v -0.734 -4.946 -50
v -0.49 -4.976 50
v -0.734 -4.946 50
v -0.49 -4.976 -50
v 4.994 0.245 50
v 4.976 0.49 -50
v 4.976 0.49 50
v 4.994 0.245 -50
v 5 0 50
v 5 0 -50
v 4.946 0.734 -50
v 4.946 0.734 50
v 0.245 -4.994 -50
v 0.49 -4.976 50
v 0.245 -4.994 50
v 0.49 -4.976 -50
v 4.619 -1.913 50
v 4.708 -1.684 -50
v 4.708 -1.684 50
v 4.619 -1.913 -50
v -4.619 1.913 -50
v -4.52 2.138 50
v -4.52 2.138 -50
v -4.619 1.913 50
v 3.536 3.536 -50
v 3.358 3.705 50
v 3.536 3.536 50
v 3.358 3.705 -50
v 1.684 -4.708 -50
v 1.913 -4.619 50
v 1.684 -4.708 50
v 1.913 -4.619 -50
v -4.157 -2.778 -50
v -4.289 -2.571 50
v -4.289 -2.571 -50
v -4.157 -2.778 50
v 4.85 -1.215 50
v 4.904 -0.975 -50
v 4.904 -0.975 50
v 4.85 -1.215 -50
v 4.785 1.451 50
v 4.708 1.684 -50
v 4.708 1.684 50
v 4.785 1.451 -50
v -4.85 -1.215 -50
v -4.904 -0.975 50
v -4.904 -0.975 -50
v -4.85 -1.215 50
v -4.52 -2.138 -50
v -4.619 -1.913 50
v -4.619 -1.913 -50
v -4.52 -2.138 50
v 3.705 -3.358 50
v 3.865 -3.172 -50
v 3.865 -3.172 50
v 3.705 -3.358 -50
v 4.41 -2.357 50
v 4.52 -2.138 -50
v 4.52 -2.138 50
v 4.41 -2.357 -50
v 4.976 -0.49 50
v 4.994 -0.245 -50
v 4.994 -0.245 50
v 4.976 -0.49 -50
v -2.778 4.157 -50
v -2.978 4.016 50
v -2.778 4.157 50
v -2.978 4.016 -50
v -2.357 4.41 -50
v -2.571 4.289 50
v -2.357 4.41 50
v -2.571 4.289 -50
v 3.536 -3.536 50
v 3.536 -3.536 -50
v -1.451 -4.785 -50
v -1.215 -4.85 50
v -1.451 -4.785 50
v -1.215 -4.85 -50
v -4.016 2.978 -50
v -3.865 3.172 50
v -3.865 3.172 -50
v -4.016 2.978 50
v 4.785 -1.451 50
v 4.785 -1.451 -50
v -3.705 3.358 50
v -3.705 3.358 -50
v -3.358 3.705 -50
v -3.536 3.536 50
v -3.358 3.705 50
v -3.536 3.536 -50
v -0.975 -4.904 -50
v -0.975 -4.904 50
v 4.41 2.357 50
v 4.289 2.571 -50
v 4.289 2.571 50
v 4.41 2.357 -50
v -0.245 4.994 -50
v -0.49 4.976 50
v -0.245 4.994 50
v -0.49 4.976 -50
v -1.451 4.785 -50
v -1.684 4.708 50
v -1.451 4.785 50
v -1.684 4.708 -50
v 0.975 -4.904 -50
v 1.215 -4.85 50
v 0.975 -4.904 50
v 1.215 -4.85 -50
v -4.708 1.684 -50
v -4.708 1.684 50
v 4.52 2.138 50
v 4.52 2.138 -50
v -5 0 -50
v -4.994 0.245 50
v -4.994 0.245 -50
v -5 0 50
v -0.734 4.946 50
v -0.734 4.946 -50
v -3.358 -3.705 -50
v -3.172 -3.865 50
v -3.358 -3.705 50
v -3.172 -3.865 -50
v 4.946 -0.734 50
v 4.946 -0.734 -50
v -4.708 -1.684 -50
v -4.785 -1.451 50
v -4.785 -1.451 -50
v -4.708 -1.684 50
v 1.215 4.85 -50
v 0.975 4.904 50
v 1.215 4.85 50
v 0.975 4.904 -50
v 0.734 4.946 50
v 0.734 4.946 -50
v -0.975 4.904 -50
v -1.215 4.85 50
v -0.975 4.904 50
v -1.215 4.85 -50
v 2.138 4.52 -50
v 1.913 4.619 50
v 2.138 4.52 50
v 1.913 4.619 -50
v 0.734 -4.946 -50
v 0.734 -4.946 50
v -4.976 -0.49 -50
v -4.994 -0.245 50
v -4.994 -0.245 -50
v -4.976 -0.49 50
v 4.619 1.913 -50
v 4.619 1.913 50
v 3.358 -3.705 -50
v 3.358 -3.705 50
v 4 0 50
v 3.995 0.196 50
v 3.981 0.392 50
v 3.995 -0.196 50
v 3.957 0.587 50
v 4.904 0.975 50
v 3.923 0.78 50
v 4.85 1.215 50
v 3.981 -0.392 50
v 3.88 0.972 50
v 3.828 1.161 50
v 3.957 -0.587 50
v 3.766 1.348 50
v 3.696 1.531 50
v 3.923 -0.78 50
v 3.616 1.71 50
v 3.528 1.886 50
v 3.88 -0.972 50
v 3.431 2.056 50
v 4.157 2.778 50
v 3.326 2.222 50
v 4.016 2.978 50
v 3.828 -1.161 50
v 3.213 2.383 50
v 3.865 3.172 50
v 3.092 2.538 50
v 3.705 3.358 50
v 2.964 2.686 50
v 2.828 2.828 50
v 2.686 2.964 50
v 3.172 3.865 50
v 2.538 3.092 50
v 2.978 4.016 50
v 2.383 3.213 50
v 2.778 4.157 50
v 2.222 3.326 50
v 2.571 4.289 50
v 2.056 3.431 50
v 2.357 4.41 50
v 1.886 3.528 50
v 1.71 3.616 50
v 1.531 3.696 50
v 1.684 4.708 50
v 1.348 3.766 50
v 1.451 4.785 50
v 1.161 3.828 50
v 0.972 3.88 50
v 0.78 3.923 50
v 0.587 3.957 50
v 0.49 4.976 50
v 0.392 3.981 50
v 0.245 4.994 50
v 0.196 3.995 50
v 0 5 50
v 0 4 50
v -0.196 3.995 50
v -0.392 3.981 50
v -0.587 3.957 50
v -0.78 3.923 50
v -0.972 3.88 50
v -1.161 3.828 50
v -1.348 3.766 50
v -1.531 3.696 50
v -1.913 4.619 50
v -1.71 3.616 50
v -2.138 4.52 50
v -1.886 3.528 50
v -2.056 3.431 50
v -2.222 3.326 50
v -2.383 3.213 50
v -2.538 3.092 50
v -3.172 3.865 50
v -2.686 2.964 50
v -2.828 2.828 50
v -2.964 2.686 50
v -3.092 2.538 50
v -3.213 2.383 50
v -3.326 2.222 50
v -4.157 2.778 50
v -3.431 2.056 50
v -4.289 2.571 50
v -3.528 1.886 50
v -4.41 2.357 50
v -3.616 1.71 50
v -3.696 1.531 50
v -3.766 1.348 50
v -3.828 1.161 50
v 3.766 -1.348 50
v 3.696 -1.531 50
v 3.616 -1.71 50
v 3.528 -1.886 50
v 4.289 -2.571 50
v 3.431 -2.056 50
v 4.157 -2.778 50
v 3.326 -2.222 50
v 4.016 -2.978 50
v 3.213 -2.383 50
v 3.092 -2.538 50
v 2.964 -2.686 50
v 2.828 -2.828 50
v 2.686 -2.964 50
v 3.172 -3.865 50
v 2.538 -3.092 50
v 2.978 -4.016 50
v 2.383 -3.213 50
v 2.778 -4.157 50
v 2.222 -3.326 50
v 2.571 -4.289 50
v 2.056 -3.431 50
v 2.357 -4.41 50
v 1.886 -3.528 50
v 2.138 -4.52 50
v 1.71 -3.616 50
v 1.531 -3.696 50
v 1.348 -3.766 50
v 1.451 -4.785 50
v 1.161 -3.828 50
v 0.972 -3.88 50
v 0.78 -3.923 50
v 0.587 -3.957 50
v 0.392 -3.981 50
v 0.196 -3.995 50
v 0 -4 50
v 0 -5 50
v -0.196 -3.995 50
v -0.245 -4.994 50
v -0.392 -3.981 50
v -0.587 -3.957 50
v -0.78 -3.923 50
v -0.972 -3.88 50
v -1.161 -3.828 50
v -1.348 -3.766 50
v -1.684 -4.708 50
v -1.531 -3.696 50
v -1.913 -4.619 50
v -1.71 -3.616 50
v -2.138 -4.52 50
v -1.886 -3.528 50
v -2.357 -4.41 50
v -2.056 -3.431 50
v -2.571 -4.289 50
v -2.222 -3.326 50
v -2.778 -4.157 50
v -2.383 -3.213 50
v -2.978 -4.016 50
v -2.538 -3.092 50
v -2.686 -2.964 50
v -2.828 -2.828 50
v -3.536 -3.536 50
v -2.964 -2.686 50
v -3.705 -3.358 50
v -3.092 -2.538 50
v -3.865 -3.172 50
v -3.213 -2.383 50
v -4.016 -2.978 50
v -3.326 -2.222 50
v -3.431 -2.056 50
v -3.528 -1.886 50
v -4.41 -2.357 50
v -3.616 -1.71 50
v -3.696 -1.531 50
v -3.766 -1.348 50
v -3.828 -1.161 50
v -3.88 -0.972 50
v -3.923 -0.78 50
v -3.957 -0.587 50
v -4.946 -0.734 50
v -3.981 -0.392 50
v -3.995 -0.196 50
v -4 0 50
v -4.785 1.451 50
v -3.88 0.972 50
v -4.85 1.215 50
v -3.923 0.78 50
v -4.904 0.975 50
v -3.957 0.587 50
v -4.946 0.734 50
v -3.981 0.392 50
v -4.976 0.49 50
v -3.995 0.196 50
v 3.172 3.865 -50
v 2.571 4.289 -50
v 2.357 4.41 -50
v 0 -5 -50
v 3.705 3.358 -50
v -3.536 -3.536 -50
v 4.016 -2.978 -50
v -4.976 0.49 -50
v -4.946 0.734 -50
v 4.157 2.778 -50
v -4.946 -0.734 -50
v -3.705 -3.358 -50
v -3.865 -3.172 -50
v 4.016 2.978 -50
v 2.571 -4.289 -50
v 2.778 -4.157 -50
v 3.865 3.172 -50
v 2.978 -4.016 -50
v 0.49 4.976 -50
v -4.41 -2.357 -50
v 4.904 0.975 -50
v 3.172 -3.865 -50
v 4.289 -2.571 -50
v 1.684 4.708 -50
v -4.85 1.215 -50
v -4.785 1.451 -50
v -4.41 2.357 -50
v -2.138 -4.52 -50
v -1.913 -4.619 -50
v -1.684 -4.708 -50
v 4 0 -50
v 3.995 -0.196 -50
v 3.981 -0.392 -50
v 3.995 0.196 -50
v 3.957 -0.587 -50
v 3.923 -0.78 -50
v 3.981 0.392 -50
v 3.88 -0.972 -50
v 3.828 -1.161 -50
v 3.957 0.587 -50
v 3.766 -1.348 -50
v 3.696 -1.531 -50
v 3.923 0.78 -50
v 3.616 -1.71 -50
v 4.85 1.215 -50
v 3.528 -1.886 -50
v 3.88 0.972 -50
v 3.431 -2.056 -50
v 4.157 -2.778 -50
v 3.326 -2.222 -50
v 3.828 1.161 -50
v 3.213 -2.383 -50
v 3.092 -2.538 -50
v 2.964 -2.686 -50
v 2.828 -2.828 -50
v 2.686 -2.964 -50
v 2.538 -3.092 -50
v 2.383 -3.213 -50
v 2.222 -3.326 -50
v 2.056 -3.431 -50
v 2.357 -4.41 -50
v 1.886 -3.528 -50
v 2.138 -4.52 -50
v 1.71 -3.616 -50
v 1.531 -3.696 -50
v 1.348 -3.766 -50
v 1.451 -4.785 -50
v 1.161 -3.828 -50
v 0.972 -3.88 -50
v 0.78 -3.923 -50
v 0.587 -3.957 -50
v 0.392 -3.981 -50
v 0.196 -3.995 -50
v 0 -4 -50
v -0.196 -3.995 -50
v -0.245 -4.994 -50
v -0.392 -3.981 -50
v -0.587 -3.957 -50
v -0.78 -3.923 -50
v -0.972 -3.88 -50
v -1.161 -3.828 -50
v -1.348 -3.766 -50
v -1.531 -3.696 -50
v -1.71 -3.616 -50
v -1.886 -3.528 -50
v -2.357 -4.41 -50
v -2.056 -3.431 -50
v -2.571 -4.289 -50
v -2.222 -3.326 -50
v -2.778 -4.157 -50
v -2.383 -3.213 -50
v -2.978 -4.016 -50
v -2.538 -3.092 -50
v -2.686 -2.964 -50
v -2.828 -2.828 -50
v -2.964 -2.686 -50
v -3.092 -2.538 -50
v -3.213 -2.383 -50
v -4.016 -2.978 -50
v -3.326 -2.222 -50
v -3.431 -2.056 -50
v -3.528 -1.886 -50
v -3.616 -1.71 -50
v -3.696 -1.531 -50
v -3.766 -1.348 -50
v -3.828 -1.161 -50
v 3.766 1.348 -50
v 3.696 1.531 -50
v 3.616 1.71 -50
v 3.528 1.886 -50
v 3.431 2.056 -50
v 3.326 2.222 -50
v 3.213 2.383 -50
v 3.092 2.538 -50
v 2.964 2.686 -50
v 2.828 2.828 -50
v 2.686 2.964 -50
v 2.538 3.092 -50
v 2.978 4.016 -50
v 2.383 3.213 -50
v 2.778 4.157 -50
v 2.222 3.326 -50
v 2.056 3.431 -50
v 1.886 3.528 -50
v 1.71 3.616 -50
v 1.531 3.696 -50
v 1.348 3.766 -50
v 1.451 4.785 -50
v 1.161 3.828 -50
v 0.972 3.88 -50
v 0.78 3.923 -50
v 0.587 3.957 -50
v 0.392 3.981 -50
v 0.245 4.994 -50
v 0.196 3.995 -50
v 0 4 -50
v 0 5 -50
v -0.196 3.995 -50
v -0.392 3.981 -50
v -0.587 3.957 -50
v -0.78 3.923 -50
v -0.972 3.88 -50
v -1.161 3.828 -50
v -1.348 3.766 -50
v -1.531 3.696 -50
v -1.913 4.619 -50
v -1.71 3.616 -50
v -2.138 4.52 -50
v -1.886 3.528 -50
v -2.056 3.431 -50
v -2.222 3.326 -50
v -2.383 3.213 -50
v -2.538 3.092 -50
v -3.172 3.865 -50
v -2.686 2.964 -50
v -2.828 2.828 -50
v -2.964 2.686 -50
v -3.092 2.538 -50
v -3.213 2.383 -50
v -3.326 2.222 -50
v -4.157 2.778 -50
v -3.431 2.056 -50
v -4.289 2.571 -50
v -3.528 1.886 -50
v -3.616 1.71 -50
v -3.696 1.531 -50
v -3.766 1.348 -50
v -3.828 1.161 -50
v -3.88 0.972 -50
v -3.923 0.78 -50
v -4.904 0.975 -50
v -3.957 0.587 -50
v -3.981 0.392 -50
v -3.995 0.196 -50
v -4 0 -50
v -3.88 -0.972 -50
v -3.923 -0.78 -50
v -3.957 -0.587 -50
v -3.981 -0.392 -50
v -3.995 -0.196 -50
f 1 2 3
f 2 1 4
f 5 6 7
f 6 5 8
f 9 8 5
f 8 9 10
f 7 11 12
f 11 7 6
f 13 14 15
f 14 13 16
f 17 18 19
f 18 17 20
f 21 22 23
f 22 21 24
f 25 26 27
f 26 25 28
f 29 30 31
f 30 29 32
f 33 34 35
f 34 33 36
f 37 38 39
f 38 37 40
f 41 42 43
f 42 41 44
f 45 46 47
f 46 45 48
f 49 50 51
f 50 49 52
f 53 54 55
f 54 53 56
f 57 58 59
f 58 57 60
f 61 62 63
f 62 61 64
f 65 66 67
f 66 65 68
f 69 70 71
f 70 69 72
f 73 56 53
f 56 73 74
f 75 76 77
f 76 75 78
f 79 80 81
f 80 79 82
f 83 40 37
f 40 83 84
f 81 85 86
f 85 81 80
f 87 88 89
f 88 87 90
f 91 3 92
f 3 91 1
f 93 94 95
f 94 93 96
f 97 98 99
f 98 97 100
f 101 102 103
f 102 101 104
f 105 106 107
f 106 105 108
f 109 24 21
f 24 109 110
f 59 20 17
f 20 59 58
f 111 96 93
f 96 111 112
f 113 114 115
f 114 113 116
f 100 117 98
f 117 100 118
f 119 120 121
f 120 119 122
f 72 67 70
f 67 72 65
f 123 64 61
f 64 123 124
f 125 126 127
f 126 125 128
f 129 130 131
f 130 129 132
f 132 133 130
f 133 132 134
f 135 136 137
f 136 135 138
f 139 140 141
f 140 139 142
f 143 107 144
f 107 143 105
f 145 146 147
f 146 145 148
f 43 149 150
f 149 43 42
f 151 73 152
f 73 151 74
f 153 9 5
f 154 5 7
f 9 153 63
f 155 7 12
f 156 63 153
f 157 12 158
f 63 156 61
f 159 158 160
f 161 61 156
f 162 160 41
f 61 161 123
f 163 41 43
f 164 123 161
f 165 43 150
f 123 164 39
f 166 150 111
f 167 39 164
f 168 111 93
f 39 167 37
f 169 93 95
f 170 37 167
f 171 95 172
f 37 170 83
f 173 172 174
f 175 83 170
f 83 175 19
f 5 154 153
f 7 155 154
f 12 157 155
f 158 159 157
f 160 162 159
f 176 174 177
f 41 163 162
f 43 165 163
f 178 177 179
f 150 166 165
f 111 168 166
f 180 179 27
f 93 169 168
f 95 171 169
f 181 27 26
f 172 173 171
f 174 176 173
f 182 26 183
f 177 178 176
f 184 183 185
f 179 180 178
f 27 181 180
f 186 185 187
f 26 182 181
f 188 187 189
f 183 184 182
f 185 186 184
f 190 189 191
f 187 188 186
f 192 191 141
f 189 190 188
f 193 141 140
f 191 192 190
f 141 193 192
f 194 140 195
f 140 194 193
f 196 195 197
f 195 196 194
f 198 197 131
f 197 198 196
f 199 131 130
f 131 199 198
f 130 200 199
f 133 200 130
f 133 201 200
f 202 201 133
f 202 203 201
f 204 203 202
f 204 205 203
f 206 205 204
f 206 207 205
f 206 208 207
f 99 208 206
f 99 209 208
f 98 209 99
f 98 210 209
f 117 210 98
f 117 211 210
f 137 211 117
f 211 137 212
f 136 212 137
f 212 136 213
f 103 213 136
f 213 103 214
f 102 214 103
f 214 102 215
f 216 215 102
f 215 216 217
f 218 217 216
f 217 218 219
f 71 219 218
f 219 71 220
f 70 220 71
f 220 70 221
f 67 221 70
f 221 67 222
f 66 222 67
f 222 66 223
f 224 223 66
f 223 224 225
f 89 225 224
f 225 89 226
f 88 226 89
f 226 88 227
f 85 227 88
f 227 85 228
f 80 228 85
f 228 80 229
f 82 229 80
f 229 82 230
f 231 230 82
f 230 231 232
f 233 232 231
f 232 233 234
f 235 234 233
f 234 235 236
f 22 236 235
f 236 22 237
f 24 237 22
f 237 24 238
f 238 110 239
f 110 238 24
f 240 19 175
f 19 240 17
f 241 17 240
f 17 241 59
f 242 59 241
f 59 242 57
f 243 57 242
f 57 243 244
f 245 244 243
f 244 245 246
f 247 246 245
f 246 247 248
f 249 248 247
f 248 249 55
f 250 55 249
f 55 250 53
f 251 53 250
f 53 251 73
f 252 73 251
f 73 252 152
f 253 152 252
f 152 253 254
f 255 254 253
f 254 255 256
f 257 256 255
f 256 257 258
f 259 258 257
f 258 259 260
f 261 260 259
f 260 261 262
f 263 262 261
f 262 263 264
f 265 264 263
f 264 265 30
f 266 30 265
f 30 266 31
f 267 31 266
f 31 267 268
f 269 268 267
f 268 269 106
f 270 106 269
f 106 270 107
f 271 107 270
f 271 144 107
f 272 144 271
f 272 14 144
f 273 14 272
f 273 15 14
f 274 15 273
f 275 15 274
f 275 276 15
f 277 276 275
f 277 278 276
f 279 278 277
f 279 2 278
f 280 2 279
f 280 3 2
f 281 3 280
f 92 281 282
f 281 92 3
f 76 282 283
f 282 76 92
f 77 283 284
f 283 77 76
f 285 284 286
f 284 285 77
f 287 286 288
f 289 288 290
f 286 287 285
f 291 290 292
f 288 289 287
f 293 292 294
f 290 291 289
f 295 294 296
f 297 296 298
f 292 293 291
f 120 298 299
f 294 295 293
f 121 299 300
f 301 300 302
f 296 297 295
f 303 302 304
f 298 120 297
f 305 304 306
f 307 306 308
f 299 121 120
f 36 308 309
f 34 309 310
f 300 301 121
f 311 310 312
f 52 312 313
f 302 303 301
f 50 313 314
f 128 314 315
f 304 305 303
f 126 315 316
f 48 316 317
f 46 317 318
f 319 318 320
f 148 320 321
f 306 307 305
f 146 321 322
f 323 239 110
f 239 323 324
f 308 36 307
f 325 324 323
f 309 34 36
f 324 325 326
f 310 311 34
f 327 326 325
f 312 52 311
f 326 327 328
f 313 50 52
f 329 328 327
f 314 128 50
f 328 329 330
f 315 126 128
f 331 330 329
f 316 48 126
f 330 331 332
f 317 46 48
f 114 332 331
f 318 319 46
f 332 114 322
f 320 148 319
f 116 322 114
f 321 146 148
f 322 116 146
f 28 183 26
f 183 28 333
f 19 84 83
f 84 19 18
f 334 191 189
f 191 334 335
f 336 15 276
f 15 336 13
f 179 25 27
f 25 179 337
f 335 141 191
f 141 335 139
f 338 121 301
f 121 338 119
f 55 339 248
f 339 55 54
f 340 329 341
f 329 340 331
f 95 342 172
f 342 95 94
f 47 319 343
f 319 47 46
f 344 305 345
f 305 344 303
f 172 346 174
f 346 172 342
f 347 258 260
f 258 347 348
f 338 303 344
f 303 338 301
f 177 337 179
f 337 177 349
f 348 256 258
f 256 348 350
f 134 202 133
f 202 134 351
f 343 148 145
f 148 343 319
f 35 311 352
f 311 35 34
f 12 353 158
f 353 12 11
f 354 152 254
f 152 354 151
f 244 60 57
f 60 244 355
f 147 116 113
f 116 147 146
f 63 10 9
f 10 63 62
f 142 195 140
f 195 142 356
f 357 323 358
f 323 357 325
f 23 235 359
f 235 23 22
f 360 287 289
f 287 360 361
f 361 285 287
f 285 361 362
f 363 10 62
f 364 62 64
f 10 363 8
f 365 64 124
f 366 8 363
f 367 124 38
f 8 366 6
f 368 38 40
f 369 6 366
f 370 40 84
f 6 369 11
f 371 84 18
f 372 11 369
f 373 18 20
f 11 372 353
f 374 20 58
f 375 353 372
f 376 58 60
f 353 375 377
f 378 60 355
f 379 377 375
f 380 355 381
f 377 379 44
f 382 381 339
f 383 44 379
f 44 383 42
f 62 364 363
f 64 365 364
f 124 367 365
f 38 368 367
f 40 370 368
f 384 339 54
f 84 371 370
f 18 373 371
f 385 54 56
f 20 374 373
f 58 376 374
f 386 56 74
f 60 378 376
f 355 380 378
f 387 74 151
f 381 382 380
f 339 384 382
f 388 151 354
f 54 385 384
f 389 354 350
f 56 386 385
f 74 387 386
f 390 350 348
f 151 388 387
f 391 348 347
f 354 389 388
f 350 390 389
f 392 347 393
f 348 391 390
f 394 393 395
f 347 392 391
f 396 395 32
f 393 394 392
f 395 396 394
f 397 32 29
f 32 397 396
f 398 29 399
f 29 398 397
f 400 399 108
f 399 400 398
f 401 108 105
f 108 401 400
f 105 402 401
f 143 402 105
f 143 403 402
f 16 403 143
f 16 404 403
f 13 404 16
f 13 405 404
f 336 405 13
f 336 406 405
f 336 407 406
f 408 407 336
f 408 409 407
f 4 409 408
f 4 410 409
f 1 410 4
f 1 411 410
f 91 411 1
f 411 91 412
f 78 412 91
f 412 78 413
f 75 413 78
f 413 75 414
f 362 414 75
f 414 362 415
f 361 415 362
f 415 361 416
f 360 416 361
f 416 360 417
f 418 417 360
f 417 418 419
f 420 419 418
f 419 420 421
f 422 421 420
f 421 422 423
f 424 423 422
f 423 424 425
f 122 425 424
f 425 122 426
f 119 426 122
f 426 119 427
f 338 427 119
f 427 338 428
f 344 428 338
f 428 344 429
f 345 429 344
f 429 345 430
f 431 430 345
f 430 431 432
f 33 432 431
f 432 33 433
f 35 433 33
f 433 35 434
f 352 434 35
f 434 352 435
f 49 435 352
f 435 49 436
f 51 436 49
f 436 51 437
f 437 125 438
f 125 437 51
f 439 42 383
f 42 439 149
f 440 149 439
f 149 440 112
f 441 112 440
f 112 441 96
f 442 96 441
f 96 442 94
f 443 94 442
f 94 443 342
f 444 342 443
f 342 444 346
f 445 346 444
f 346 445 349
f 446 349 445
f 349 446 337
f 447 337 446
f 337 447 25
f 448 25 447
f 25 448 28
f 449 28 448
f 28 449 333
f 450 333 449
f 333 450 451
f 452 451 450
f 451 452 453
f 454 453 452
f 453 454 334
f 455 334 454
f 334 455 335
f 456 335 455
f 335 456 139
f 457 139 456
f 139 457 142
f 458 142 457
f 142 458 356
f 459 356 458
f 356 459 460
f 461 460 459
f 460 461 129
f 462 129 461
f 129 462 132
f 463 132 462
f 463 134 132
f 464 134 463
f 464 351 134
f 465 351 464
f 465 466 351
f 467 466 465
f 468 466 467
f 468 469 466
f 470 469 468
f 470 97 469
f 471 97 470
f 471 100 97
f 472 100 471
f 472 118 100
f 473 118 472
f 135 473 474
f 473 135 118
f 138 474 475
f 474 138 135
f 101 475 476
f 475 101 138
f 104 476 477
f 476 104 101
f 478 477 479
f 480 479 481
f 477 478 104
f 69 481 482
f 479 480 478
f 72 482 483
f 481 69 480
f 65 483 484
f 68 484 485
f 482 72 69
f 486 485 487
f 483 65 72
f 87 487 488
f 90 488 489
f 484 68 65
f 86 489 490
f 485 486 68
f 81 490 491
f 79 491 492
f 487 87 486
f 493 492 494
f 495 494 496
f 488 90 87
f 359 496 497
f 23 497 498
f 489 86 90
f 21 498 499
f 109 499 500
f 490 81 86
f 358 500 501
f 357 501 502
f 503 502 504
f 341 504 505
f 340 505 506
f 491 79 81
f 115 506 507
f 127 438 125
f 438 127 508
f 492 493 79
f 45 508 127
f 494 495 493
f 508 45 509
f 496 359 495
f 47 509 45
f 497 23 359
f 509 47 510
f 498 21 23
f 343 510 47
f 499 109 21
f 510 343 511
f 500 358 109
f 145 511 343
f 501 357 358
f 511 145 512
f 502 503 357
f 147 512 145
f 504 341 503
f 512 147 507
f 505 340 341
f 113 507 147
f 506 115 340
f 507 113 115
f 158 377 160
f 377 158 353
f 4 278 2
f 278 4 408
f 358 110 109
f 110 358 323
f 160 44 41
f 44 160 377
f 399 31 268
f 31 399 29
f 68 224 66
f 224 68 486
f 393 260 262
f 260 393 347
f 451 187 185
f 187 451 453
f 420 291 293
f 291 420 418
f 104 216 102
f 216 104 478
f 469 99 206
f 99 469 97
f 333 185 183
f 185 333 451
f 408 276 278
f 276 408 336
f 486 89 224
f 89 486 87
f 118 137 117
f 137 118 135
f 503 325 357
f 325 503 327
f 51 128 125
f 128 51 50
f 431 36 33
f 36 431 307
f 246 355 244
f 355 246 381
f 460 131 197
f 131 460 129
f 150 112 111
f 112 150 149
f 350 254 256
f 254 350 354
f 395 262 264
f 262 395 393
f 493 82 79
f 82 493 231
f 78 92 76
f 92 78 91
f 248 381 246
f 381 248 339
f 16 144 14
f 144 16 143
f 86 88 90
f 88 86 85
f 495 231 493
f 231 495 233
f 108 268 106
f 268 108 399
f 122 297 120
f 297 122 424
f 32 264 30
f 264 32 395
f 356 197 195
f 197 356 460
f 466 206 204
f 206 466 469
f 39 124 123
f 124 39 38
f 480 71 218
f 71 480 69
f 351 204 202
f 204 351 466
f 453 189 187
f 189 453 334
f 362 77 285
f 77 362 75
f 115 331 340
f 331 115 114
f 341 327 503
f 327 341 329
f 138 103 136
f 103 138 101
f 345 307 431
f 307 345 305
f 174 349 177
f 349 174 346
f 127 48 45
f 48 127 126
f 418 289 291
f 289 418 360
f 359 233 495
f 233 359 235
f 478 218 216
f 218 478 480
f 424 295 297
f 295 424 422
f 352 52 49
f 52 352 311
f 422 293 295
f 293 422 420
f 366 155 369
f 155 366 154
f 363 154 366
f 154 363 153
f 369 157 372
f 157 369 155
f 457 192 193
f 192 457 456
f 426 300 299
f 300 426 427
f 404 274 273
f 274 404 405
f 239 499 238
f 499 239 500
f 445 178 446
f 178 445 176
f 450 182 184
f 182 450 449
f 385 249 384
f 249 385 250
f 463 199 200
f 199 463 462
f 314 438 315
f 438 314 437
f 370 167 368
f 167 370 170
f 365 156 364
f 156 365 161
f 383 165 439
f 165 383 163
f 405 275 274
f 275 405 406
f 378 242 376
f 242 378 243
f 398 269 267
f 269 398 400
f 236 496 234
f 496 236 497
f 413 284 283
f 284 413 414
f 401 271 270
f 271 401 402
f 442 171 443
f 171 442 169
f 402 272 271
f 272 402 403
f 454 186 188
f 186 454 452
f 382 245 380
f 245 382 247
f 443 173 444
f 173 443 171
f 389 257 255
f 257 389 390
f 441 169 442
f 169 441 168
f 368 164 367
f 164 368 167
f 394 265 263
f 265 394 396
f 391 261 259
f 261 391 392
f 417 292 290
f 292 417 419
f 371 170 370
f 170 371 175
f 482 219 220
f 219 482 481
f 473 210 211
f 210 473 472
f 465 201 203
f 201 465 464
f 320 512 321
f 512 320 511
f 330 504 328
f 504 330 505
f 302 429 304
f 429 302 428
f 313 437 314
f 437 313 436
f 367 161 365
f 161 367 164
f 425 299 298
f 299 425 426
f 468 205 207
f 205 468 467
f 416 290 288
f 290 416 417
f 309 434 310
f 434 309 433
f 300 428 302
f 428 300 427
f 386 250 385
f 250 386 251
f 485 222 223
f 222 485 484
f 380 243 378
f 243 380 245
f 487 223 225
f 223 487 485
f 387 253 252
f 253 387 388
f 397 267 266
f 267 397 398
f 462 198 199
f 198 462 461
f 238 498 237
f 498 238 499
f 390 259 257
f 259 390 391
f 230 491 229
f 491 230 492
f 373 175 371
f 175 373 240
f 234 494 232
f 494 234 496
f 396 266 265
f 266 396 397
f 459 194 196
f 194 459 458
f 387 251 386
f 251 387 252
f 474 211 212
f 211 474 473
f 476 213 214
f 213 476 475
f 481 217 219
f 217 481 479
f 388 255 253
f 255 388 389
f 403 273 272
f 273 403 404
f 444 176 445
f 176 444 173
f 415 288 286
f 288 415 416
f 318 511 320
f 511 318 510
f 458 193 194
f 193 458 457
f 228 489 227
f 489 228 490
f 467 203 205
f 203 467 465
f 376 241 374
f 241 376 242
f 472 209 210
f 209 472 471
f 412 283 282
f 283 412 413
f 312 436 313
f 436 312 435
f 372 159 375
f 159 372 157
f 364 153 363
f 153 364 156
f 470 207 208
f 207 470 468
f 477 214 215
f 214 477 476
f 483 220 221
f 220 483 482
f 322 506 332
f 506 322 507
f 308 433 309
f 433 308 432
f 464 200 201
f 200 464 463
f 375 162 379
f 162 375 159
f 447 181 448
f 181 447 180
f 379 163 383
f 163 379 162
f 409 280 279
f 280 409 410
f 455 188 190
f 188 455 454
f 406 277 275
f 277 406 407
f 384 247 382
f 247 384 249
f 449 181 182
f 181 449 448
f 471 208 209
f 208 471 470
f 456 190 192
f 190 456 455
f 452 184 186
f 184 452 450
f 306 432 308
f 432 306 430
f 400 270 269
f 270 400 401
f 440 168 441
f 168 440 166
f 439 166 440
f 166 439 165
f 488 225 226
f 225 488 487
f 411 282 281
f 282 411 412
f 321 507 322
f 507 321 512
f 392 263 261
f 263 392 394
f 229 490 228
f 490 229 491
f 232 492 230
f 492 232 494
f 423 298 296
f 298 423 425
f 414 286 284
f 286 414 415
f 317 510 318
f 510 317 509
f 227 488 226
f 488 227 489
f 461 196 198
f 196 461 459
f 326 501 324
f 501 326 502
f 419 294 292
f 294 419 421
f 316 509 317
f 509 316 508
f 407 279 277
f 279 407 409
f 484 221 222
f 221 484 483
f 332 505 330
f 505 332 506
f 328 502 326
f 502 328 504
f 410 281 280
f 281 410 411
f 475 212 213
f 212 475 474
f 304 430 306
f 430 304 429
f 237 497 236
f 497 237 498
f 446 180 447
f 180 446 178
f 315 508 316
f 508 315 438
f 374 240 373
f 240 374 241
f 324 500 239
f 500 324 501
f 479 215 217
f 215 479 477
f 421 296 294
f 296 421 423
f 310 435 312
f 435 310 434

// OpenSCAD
// PTFE sleeving (hollow tube)

outer_diameter = 10; // mm
inner_diameter = 8;  // mm
length = 100;        // mm
centered = true;

eps = 0.02;          // small overlap to ensure clean boolean

$fn = 128;

module ptfe_sleeving(od, id, h, center=true) {
    // Guard against invalid dimensions
    id2 = min(id, od - 2*eps);

    difference() {
        cylinder(d=od, h=h, center=center);
        // Extend the bore slightly so it fully cuts through even with centering/precision
        cylinder(d=id2, h=h + 2*eps, center=center);
    }
}

ptfe_sleeving(outer_diameter, inner_diameter, length, centered);
